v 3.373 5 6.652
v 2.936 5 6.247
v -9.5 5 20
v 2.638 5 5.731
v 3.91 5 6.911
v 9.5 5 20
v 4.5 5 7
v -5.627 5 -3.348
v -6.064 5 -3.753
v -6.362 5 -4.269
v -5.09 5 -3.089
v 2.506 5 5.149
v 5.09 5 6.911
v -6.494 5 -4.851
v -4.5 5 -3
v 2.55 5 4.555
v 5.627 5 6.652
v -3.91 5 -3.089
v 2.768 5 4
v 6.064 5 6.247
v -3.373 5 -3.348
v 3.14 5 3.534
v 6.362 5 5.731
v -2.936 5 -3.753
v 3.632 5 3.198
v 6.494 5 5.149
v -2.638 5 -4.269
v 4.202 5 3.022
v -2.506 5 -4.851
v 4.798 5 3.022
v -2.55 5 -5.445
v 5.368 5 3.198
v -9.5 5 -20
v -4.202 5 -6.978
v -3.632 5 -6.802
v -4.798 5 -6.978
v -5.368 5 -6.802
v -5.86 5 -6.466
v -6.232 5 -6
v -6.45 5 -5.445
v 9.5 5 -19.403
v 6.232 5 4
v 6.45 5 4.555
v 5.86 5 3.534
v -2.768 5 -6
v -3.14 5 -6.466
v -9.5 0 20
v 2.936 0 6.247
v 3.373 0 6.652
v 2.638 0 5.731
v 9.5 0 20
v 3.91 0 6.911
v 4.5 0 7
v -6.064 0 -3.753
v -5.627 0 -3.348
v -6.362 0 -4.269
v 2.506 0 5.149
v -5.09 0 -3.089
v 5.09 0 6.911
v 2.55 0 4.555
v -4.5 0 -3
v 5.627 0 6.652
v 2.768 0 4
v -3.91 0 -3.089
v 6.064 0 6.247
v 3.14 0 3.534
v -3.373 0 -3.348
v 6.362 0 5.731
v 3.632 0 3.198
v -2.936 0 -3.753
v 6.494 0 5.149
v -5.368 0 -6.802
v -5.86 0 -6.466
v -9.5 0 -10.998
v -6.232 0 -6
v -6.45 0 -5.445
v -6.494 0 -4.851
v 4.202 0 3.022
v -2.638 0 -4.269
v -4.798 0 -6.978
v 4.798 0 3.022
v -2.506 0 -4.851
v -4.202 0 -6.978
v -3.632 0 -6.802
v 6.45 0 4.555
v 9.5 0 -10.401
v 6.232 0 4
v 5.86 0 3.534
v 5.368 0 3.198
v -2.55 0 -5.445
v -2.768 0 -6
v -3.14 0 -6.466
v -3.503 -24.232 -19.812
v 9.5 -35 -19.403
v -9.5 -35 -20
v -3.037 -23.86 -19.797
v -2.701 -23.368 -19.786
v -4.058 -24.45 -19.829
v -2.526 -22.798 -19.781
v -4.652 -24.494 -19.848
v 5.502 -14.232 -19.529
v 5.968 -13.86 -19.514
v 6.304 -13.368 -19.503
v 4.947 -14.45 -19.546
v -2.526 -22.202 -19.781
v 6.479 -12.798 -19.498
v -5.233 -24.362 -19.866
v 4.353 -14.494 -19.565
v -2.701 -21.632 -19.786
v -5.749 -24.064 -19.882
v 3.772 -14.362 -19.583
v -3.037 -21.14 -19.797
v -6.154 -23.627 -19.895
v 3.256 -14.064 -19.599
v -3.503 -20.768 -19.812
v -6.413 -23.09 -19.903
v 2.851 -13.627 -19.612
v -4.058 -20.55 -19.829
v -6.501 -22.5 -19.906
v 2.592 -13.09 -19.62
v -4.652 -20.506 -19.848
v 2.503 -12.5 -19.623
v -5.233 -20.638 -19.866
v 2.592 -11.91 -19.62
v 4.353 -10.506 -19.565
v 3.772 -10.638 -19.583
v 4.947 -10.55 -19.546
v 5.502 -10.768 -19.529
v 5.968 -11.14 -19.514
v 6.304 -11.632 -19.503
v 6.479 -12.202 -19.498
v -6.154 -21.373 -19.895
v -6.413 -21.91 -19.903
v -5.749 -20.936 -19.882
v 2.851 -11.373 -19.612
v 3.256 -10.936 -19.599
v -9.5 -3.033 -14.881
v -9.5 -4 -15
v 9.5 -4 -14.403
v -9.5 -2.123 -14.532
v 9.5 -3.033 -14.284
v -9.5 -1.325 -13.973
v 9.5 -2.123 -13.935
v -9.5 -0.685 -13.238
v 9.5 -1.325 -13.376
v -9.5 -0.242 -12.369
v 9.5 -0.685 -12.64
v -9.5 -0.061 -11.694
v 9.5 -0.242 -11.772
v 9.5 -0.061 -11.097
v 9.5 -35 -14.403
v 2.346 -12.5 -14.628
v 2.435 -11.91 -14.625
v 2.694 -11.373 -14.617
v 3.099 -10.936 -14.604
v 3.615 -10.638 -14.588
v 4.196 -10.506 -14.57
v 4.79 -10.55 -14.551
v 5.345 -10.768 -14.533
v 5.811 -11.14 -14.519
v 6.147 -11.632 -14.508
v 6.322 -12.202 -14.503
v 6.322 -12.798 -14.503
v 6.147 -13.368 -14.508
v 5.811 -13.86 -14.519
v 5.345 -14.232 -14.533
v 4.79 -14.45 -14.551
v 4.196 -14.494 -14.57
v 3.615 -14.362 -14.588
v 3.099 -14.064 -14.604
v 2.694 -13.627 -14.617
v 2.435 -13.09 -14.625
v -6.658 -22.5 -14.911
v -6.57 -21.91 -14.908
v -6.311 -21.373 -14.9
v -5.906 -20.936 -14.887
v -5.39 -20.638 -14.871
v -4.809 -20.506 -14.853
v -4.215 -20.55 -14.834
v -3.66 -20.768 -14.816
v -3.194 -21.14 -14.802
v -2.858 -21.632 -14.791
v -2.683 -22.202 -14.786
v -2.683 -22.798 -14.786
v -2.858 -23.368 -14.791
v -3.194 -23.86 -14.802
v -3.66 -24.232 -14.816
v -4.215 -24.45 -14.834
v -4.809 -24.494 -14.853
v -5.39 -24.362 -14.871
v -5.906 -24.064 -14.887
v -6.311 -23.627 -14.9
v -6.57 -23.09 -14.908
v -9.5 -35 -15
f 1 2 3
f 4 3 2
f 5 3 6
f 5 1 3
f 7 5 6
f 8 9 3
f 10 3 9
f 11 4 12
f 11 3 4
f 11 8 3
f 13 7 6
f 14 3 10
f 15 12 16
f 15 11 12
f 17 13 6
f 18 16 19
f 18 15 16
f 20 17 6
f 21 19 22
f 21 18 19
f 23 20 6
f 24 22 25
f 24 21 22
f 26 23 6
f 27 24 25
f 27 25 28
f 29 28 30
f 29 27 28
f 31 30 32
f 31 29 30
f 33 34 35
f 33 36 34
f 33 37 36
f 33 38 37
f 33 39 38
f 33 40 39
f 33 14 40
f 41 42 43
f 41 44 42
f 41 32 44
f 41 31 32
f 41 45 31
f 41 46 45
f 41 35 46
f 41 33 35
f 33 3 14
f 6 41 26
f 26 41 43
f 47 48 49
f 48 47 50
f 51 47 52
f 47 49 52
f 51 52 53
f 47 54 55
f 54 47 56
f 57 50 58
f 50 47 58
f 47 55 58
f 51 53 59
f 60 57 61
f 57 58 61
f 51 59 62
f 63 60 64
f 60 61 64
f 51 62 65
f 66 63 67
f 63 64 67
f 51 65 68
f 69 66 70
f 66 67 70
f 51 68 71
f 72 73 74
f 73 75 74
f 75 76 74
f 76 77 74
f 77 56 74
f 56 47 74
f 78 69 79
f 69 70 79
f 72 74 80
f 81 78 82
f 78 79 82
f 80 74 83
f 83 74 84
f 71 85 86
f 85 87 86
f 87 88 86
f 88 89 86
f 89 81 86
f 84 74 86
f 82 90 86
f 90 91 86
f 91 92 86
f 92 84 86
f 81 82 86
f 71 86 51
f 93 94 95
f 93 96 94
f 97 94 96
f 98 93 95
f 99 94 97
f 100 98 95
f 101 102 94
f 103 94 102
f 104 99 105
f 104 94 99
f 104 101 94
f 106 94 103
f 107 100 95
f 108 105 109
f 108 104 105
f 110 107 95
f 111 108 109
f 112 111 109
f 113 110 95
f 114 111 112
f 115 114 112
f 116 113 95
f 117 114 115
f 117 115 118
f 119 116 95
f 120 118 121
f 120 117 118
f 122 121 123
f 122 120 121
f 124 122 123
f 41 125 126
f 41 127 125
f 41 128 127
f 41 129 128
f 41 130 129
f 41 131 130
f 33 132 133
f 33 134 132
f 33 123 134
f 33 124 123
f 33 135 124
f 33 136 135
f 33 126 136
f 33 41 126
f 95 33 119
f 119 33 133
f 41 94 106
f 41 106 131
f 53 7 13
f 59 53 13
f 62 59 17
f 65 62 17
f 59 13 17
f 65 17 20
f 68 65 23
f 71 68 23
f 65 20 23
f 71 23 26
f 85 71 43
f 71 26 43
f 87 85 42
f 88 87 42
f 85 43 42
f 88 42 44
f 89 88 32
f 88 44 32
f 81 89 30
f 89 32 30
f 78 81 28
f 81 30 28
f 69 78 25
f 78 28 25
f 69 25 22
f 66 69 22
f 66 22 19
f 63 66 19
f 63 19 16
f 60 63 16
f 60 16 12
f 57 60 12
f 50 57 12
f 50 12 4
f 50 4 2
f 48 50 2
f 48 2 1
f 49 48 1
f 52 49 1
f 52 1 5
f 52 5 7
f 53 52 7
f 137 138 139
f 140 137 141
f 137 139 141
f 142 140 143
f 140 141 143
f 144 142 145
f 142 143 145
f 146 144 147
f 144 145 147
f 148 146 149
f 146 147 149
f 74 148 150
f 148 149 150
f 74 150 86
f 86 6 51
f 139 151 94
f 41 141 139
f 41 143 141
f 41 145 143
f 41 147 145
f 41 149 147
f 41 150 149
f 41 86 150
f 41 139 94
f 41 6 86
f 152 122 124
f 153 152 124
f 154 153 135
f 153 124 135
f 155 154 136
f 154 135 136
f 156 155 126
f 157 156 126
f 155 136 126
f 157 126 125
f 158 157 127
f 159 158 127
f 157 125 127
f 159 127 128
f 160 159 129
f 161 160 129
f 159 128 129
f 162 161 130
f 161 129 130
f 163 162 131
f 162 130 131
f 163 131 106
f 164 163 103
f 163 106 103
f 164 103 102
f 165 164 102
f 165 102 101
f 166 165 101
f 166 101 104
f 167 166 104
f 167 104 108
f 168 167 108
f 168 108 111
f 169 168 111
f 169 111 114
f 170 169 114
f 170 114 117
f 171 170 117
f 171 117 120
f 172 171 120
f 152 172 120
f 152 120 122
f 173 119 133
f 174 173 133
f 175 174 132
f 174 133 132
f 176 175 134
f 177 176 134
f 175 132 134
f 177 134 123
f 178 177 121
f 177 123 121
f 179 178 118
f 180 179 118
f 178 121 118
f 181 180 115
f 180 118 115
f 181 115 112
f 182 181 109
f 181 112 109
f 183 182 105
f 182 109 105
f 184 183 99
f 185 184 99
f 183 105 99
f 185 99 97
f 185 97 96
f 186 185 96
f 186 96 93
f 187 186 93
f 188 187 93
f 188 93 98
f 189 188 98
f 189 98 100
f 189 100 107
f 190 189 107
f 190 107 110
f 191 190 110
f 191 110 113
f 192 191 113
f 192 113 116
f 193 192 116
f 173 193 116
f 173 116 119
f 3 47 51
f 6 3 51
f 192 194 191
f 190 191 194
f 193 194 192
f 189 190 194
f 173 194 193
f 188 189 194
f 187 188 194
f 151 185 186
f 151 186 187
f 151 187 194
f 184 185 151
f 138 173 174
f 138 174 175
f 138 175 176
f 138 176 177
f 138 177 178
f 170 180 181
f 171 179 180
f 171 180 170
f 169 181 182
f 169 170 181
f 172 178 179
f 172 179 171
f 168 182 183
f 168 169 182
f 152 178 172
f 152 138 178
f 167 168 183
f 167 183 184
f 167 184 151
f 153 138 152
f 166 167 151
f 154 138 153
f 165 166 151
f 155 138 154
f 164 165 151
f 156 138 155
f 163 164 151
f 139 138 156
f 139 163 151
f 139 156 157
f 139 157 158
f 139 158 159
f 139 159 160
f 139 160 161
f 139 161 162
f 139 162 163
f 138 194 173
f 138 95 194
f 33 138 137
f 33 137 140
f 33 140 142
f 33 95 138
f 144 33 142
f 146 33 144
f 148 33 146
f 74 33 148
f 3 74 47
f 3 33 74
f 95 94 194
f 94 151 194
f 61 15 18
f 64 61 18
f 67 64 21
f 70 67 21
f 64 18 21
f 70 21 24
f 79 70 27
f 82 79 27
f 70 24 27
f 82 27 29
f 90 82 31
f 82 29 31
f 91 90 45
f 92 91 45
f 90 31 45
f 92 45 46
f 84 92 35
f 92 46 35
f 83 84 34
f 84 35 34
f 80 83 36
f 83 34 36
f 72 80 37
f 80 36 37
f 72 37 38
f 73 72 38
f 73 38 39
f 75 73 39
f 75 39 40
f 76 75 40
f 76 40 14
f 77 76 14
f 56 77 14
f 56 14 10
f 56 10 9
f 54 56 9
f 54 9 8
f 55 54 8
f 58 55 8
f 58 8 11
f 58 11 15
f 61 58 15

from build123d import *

# Parameters (mm, degrees)
SKETCH1_W           = 19
SKETCH1_H           = 40
BOSS_EXTRUDE1_DEPTH = 5
CUT_EXTRUDE1_DEPTH  = 23.699118926
BOSS_EXTRUDE2_DEPTH = 35
SKETCH5_R           = 2
CUT_EXTRUDE2_DEPTH  = 46.719251962
SKETCH6_R           = 2
CUT_EXTRUDE3_DEPTH  = 54.870648729
FILLET1_R           = 4


with BuildPart() as part:
    # Sketch1 → Boss-Extrude1 (new body)
    with BuildSketch(Plane(origin=(0, 0, 0), x_dir=(1, 0, 0), z_dir=(0, 1, 0))):
        Rectangle(SKETCH1_W, SKETCH1_H)
    extrude(amount=BOSS_EXTRUDE1_DEPTH)

    # Sketch2 → Cut-Extrude1 (cut, through all)
    with BuildSketch(Plane(origin=(0, 5, 0), x_dir=(1, 0, 0), z_dir=(0, 1, 0))):
        Polygon((-9.5, 20), (9.5, 20), (9.5, 19.402900945), align=None)
    extrude(amount=-CUT_EXTRUDE1_DEPTH, mode=Mode.SUBTRACT)

    # Sketch4 → Boss-Extrude2 (add)
    with BuildSketch(Plane.XZ):
        Polygon((9.5, -19.402900945), (-9.5, -20), (-9.5, -15), (9.5, -14.402900945), align=None)
    extrude(amount=BOSS_EXTRUDE2_DEPTH)

    # Sketch5 → Cut-Extrude2 (cut, through all)
    with BuildSketch(Plane(origin=(0, 5, 0), x_dir=(1, 0, 0), z_dir=(0, 1, 0))):
        with Locations(Location((-4.5, 5, 0), (0, 0, 270))):
            Circle(SKETCH5_R)
        with Locations(Location((4.5, -5, 0), (0, 0, 270))):
            Circle(SKETCH5_R)
    extrude(amount=-CUT_EXTRUDE2_DEPTH, mode=Mode.SUBTRACT)

    # Sketch6 → Cut-Extrude3 (cut, through all)
    with BuildSketch(Plane(origin=(0.618532155, 0, -19.682012317), x_dir=(-0.9995065603657318, 0, -0.03141075907812129), z_dir=(0.03141075907812129, 0, -0.9995065603657318))):
        with Locations((-3.885852476, -12.5)):
            Circle(SKETCH6_R)
        with Locations((5.123527505, -22.5)):
            Circle(SKETCH6_R)
    extrude(amount=-CUT_EXTRUDE3_DEPTH, mode=Mode.SUBTRACT)

    # Fillet1
    fillet1_edges = [part.edges().sort_by_distance(p)[0] for p in [
        (0, 0, -14.701450473),
    ]]
    fillet(fillet1_edges, radius=FILLET1_R)


solid = part.part
